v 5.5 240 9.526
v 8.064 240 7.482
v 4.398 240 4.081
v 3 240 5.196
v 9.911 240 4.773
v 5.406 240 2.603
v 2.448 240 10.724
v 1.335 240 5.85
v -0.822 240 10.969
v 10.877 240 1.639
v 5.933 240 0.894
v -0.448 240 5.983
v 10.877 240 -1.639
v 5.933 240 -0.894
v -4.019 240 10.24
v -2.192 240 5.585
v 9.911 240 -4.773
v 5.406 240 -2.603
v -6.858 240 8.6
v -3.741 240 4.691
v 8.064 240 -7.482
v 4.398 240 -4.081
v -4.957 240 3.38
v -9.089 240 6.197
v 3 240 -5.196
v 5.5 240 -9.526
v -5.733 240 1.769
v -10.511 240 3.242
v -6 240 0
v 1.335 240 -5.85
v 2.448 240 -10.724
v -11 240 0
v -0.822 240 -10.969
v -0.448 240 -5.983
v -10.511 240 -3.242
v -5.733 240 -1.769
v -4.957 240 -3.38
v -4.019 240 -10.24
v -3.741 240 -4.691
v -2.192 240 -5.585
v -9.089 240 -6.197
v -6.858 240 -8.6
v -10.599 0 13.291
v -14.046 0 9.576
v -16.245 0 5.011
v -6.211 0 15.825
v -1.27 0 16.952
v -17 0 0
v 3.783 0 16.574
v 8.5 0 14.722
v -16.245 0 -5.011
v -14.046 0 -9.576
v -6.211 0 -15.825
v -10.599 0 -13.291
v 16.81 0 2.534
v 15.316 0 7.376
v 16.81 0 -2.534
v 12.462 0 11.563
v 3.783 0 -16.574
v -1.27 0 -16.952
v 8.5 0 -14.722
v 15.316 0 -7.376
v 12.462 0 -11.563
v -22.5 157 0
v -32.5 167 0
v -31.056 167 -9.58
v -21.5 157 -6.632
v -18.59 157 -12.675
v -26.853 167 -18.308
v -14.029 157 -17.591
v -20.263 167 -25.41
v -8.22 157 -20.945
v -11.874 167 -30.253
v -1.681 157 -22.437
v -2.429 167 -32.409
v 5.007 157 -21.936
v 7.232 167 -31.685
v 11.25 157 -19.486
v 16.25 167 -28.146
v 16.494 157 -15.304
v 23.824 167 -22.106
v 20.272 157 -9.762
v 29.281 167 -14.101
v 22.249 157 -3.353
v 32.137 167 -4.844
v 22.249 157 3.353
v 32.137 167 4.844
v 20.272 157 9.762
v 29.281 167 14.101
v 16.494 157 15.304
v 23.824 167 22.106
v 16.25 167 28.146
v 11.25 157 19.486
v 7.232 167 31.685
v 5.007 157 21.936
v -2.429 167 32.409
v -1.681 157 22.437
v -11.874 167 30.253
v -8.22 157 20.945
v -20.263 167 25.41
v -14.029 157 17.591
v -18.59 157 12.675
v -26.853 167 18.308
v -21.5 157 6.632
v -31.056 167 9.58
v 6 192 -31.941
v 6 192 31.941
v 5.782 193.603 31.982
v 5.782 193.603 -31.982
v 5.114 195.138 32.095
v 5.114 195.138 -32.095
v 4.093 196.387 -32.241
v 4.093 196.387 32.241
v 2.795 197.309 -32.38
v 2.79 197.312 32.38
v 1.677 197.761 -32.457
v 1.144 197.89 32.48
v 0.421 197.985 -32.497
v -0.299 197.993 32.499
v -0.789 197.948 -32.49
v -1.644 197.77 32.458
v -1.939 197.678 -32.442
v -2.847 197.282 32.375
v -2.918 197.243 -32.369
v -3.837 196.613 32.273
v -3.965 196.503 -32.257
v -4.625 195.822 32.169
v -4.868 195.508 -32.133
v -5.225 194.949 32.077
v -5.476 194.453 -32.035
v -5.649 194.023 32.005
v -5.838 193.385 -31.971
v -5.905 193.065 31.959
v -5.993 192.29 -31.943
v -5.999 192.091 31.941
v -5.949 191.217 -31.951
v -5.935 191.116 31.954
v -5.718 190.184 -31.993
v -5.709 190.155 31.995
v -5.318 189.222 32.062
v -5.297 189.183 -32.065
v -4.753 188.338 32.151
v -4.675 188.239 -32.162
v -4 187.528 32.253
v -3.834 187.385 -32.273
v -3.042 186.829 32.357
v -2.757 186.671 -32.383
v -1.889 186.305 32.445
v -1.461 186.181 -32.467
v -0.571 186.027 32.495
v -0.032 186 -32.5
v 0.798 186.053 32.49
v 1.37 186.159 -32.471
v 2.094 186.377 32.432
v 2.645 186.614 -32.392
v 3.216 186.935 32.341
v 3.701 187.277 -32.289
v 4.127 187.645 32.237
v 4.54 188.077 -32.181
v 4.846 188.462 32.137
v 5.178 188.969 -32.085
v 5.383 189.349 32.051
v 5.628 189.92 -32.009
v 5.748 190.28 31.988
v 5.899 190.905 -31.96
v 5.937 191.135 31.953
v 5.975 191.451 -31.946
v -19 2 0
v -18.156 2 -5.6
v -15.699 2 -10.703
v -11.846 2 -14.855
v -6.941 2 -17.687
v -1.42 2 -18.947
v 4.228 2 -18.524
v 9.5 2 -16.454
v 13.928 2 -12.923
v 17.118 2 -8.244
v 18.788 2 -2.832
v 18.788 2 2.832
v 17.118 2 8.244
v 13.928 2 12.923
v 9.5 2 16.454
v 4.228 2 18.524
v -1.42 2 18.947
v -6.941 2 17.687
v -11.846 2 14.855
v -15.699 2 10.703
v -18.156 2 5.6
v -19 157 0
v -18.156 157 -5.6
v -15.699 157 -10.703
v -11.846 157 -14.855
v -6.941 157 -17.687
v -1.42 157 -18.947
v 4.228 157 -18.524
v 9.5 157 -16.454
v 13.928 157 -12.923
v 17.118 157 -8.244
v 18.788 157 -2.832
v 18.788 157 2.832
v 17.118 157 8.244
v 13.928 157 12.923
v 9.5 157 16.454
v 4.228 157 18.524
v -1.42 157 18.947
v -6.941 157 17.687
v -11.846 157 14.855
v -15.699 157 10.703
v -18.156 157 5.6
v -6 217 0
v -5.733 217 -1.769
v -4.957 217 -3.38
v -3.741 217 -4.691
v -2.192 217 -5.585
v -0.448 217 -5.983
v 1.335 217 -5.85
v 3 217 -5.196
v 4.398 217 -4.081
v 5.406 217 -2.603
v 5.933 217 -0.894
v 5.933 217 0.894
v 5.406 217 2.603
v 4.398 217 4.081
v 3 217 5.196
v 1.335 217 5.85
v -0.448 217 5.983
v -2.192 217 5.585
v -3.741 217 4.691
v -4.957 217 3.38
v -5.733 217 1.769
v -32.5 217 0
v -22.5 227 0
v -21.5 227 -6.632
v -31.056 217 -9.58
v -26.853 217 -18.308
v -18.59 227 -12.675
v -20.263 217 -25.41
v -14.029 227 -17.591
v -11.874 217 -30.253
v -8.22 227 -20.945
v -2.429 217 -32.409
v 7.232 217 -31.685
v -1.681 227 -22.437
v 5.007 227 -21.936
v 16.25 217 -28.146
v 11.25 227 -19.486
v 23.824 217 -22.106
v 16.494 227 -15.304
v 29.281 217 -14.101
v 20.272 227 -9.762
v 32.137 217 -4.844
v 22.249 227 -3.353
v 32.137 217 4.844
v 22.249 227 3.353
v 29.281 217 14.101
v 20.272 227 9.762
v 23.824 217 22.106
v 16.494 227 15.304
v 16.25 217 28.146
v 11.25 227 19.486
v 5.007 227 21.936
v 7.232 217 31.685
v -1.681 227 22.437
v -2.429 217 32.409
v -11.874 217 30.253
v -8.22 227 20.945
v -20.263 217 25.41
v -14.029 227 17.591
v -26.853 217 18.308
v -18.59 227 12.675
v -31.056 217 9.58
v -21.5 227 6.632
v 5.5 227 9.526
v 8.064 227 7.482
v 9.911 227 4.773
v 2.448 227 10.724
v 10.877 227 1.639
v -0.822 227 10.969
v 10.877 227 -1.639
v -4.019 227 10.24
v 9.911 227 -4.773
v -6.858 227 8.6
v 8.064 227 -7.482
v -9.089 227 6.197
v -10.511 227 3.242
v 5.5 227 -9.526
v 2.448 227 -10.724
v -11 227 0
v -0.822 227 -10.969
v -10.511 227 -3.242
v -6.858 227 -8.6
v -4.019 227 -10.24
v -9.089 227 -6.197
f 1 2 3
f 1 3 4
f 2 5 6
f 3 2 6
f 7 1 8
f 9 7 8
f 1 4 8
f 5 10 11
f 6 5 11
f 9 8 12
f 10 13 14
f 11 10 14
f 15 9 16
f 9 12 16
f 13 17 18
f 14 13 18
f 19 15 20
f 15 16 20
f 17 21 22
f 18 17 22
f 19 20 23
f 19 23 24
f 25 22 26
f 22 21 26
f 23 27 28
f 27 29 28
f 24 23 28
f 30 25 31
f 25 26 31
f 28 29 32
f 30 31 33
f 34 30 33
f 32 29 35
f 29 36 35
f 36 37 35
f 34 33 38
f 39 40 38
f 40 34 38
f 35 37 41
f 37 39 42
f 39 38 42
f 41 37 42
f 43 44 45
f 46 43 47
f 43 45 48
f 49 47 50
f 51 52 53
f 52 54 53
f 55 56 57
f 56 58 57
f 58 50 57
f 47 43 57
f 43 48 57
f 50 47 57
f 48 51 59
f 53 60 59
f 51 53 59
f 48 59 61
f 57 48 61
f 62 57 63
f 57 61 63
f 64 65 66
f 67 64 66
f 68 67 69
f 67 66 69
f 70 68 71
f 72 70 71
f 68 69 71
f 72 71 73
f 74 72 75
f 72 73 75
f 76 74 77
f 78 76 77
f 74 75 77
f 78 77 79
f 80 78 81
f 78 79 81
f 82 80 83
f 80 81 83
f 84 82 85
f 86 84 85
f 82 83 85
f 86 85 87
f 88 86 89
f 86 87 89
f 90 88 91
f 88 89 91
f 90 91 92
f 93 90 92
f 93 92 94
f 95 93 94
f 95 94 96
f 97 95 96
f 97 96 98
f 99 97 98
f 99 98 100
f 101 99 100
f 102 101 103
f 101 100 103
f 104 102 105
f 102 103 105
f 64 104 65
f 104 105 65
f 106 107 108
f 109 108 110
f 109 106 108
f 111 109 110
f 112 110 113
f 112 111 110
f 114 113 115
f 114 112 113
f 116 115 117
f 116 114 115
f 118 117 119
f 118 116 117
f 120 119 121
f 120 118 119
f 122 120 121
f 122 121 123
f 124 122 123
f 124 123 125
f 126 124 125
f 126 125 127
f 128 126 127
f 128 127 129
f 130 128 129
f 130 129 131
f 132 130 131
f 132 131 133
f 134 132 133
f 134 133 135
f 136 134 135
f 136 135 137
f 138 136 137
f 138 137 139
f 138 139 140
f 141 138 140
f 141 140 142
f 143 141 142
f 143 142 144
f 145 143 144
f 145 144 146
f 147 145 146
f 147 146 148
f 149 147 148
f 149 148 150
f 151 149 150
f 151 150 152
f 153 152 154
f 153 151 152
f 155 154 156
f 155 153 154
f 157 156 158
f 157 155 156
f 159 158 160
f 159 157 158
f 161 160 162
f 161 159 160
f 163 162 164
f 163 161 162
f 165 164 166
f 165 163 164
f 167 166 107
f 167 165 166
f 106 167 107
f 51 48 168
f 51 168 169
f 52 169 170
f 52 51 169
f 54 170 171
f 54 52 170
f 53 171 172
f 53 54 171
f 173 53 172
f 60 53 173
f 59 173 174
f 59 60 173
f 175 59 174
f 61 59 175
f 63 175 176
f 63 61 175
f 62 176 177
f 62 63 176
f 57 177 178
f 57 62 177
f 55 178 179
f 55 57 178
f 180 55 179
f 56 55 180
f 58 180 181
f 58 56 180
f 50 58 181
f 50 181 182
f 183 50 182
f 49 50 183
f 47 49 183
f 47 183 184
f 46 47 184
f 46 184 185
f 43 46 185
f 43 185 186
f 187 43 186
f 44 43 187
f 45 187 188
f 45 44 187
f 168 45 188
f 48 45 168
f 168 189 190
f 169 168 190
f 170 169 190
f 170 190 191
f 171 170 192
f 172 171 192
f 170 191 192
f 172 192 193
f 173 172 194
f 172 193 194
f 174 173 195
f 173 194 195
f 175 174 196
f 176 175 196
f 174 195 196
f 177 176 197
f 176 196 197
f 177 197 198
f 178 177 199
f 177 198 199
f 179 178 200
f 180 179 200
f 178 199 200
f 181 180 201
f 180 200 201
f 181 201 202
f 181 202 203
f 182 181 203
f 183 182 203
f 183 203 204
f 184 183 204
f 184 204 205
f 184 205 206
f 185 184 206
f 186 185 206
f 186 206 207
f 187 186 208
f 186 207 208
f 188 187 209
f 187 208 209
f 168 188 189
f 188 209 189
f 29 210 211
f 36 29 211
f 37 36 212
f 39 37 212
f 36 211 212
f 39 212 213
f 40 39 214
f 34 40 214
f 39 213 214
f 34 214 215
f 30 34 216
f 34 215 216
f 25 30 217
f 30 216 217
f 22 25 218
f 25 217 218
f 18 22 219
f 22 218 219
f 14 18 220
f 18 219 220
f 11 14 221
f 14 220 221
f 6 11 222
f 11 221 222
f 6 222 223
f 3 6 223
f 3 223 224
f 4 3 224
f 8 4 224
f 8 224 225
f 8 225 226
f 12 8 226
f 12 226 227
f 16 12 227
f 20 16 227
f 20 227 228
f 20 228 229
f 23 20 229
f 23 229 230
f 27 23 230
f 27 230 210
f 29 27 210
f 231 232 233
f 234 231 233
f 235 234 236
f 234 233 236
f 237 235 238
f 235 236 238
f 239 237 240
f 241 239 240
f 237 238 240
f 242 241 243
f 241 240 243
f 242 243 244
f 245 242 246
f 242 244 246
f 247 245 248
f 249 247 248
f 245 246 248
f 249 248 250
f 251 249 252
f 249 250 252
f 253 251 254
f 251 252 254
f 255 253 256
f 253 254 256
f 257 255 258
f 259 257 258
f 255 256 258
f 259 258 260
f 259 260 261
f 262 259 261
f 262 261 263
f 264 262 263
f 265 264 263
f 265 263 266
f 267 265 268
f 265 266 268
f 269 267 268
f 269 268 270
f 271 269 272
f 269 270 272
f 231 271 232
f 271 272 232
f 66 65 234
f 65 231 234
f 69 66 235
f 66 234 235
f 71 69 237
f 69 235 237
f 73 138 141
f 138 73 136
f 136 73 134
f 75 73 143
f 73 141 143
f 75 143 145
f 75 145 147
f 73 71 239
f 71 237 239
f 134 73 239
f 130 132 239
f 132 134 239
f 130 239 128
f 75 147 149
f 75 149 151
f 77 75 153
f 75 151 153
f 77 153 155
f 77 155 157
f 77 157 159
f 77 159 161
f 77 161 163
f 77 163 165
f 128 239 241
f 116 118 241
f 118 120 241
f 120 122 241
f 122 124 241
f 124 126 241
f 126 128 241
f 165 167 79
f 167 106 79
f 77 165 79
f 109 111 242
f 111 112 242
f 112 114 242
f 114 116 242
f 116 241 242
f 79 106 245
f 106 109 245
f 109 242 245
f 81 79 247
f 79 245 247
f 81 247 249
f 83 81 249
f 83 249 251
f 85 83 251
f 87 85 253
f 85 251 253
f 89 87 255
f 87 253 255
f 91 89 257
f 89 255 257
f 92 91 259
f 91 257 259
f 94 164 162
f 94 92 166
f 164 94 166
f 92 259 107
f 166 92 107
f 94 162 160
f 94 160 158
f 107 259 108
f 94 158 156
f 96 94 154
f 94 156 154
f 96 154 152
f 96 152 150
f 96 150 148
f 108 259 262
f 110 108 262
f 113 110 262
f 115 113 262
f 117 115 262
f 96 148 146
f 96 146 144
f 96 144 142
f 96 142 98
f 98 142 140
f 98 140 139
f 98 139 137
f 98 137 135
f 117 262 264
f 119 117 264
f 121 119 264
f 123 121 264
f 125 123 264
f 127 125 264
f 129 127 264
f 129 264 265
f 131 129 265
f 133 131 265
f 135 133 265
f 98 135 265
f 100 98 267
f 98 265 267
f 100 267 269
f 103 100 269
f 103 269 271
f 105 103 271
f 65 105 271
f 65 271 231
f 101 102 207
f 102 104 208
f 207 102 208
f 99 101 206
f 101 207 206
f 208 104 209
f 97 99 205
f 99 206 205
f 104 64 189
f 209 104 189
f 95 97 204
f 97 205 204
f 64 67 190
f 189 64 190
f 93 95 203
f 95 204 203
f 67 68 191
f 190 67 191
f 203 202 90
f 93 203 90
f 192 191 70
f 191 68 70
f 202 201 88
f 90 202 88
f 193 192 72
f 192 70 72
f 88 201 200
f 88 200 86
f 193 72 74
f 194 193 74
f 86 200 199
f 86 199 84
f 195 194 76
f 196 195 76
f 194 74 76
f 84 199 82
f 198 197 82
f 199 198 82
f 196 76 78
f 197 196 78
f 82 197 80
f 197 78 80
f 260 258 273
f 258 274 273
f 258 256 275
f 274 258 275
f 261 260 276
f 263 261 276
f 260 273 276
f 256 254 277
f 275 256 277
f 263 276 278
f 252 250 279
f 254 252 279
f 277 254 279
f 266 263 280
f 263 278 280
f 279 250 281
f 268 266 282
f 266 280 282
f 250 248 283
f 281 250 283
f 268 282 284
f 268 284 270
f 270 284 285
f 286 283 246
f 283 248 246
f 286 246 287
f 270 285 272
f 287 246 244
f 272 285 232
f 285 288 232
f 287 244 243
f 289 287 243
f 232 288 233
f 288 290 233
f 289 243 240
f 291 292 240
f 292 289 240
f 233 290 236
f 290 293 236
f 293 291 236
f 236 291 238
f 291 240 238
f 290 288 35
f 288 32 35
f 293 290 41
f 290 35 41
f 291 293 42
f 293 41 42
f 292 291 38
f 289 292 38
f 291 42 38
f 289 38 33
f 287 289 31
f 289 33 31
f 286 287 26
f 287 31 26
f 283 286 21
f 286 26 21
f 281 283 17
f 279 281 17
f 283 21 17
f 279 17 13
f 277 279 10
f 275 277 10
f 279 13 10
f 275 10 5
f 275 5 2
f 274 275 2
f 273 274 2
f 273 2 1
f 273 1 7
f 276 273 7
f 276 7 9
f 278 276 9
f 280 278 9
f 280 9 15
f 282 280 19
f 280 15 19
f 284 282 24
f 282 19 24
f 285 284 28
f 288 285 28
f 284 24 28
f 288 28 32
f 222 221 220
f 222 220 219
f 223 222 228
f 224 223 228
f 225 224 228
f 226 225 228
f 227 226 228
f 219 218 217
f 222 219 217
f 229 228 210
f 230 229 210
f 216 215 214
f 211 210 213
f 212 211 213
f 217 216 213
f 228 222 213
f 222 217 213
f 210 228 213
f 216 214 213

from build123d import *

# Parameters (mm, degrees)
CHAMFER1_SIZE           = 10
CUT_EXTRUDE1_DEPTH      = 245.361412666
CUT_EXTRUDE1_DEPTH_BACK = 245.361412666
SKETCH2_R               = 6
HOLE1_D                 = 12
HOLE1_DEPTH             = 23
CHAMFER2_SIZE           = 2


with BuildPart() as part:
    # Sketch1 → Revolve1 (revolve)
    with BuildSketch(Plane.XY, mode=Mode.PRIVATE) as revolve1_sk:
        Polygon((0, 0), (19, 0), (19, 157), (32.5, 157), (32.5, 227), (11, 227), (11, 240), (0, 240), align=None)
    revolve(revolve1_sk.sketch.rotate(Axis((0, 240, 0), (0, -1, 0)), 180), axis=Axis((0, 240, 0), (0, -1, 0)))

    # Chamfer1
    chamfer1_edges = [part.edges().sort_by_distance(p)[0] for p in [
        (32.5, 227, 0),
        (32.5, 157, 0),
    ]]
    chamfer(chamfer1_edges, length=CHAMFER1_SIZE)

    # Sketch2 → Cut-Extrude1 (cut, two sides: drawn at the far end of the back side and taken through both)
    with BuildSketch(Plane.XY.offset(-CUT_EXTRUDE1_DEPTH_BACK)):
        with Locations((0, 192)):
            Circle(SKETCH2_R)
    extrude(amount=CUT_EXTRUDE1_DEPTH + CUT_EXTRUDE1_DEPTH_BACK, mode=Mode.SUBTRACT)

    # Hole1
    with Locations(Plane(origin=(0, 240, 0), x_dir=(1, 0, 0), z_dir=(0, 1, 0))):
        with Locations((0, 0)):
            Hole(HOLE1_D / 2, depth=HOLE1_DEPTH)

    # Chamfer2
    chamfer2_edges = [part.edges().sort_by_distance(p)[0] for p in [
        (19, 0, 0),
    ]]
    chamfer(chamfer2_edges, length=CHAMFER2_SIZE)


solid = part.part
